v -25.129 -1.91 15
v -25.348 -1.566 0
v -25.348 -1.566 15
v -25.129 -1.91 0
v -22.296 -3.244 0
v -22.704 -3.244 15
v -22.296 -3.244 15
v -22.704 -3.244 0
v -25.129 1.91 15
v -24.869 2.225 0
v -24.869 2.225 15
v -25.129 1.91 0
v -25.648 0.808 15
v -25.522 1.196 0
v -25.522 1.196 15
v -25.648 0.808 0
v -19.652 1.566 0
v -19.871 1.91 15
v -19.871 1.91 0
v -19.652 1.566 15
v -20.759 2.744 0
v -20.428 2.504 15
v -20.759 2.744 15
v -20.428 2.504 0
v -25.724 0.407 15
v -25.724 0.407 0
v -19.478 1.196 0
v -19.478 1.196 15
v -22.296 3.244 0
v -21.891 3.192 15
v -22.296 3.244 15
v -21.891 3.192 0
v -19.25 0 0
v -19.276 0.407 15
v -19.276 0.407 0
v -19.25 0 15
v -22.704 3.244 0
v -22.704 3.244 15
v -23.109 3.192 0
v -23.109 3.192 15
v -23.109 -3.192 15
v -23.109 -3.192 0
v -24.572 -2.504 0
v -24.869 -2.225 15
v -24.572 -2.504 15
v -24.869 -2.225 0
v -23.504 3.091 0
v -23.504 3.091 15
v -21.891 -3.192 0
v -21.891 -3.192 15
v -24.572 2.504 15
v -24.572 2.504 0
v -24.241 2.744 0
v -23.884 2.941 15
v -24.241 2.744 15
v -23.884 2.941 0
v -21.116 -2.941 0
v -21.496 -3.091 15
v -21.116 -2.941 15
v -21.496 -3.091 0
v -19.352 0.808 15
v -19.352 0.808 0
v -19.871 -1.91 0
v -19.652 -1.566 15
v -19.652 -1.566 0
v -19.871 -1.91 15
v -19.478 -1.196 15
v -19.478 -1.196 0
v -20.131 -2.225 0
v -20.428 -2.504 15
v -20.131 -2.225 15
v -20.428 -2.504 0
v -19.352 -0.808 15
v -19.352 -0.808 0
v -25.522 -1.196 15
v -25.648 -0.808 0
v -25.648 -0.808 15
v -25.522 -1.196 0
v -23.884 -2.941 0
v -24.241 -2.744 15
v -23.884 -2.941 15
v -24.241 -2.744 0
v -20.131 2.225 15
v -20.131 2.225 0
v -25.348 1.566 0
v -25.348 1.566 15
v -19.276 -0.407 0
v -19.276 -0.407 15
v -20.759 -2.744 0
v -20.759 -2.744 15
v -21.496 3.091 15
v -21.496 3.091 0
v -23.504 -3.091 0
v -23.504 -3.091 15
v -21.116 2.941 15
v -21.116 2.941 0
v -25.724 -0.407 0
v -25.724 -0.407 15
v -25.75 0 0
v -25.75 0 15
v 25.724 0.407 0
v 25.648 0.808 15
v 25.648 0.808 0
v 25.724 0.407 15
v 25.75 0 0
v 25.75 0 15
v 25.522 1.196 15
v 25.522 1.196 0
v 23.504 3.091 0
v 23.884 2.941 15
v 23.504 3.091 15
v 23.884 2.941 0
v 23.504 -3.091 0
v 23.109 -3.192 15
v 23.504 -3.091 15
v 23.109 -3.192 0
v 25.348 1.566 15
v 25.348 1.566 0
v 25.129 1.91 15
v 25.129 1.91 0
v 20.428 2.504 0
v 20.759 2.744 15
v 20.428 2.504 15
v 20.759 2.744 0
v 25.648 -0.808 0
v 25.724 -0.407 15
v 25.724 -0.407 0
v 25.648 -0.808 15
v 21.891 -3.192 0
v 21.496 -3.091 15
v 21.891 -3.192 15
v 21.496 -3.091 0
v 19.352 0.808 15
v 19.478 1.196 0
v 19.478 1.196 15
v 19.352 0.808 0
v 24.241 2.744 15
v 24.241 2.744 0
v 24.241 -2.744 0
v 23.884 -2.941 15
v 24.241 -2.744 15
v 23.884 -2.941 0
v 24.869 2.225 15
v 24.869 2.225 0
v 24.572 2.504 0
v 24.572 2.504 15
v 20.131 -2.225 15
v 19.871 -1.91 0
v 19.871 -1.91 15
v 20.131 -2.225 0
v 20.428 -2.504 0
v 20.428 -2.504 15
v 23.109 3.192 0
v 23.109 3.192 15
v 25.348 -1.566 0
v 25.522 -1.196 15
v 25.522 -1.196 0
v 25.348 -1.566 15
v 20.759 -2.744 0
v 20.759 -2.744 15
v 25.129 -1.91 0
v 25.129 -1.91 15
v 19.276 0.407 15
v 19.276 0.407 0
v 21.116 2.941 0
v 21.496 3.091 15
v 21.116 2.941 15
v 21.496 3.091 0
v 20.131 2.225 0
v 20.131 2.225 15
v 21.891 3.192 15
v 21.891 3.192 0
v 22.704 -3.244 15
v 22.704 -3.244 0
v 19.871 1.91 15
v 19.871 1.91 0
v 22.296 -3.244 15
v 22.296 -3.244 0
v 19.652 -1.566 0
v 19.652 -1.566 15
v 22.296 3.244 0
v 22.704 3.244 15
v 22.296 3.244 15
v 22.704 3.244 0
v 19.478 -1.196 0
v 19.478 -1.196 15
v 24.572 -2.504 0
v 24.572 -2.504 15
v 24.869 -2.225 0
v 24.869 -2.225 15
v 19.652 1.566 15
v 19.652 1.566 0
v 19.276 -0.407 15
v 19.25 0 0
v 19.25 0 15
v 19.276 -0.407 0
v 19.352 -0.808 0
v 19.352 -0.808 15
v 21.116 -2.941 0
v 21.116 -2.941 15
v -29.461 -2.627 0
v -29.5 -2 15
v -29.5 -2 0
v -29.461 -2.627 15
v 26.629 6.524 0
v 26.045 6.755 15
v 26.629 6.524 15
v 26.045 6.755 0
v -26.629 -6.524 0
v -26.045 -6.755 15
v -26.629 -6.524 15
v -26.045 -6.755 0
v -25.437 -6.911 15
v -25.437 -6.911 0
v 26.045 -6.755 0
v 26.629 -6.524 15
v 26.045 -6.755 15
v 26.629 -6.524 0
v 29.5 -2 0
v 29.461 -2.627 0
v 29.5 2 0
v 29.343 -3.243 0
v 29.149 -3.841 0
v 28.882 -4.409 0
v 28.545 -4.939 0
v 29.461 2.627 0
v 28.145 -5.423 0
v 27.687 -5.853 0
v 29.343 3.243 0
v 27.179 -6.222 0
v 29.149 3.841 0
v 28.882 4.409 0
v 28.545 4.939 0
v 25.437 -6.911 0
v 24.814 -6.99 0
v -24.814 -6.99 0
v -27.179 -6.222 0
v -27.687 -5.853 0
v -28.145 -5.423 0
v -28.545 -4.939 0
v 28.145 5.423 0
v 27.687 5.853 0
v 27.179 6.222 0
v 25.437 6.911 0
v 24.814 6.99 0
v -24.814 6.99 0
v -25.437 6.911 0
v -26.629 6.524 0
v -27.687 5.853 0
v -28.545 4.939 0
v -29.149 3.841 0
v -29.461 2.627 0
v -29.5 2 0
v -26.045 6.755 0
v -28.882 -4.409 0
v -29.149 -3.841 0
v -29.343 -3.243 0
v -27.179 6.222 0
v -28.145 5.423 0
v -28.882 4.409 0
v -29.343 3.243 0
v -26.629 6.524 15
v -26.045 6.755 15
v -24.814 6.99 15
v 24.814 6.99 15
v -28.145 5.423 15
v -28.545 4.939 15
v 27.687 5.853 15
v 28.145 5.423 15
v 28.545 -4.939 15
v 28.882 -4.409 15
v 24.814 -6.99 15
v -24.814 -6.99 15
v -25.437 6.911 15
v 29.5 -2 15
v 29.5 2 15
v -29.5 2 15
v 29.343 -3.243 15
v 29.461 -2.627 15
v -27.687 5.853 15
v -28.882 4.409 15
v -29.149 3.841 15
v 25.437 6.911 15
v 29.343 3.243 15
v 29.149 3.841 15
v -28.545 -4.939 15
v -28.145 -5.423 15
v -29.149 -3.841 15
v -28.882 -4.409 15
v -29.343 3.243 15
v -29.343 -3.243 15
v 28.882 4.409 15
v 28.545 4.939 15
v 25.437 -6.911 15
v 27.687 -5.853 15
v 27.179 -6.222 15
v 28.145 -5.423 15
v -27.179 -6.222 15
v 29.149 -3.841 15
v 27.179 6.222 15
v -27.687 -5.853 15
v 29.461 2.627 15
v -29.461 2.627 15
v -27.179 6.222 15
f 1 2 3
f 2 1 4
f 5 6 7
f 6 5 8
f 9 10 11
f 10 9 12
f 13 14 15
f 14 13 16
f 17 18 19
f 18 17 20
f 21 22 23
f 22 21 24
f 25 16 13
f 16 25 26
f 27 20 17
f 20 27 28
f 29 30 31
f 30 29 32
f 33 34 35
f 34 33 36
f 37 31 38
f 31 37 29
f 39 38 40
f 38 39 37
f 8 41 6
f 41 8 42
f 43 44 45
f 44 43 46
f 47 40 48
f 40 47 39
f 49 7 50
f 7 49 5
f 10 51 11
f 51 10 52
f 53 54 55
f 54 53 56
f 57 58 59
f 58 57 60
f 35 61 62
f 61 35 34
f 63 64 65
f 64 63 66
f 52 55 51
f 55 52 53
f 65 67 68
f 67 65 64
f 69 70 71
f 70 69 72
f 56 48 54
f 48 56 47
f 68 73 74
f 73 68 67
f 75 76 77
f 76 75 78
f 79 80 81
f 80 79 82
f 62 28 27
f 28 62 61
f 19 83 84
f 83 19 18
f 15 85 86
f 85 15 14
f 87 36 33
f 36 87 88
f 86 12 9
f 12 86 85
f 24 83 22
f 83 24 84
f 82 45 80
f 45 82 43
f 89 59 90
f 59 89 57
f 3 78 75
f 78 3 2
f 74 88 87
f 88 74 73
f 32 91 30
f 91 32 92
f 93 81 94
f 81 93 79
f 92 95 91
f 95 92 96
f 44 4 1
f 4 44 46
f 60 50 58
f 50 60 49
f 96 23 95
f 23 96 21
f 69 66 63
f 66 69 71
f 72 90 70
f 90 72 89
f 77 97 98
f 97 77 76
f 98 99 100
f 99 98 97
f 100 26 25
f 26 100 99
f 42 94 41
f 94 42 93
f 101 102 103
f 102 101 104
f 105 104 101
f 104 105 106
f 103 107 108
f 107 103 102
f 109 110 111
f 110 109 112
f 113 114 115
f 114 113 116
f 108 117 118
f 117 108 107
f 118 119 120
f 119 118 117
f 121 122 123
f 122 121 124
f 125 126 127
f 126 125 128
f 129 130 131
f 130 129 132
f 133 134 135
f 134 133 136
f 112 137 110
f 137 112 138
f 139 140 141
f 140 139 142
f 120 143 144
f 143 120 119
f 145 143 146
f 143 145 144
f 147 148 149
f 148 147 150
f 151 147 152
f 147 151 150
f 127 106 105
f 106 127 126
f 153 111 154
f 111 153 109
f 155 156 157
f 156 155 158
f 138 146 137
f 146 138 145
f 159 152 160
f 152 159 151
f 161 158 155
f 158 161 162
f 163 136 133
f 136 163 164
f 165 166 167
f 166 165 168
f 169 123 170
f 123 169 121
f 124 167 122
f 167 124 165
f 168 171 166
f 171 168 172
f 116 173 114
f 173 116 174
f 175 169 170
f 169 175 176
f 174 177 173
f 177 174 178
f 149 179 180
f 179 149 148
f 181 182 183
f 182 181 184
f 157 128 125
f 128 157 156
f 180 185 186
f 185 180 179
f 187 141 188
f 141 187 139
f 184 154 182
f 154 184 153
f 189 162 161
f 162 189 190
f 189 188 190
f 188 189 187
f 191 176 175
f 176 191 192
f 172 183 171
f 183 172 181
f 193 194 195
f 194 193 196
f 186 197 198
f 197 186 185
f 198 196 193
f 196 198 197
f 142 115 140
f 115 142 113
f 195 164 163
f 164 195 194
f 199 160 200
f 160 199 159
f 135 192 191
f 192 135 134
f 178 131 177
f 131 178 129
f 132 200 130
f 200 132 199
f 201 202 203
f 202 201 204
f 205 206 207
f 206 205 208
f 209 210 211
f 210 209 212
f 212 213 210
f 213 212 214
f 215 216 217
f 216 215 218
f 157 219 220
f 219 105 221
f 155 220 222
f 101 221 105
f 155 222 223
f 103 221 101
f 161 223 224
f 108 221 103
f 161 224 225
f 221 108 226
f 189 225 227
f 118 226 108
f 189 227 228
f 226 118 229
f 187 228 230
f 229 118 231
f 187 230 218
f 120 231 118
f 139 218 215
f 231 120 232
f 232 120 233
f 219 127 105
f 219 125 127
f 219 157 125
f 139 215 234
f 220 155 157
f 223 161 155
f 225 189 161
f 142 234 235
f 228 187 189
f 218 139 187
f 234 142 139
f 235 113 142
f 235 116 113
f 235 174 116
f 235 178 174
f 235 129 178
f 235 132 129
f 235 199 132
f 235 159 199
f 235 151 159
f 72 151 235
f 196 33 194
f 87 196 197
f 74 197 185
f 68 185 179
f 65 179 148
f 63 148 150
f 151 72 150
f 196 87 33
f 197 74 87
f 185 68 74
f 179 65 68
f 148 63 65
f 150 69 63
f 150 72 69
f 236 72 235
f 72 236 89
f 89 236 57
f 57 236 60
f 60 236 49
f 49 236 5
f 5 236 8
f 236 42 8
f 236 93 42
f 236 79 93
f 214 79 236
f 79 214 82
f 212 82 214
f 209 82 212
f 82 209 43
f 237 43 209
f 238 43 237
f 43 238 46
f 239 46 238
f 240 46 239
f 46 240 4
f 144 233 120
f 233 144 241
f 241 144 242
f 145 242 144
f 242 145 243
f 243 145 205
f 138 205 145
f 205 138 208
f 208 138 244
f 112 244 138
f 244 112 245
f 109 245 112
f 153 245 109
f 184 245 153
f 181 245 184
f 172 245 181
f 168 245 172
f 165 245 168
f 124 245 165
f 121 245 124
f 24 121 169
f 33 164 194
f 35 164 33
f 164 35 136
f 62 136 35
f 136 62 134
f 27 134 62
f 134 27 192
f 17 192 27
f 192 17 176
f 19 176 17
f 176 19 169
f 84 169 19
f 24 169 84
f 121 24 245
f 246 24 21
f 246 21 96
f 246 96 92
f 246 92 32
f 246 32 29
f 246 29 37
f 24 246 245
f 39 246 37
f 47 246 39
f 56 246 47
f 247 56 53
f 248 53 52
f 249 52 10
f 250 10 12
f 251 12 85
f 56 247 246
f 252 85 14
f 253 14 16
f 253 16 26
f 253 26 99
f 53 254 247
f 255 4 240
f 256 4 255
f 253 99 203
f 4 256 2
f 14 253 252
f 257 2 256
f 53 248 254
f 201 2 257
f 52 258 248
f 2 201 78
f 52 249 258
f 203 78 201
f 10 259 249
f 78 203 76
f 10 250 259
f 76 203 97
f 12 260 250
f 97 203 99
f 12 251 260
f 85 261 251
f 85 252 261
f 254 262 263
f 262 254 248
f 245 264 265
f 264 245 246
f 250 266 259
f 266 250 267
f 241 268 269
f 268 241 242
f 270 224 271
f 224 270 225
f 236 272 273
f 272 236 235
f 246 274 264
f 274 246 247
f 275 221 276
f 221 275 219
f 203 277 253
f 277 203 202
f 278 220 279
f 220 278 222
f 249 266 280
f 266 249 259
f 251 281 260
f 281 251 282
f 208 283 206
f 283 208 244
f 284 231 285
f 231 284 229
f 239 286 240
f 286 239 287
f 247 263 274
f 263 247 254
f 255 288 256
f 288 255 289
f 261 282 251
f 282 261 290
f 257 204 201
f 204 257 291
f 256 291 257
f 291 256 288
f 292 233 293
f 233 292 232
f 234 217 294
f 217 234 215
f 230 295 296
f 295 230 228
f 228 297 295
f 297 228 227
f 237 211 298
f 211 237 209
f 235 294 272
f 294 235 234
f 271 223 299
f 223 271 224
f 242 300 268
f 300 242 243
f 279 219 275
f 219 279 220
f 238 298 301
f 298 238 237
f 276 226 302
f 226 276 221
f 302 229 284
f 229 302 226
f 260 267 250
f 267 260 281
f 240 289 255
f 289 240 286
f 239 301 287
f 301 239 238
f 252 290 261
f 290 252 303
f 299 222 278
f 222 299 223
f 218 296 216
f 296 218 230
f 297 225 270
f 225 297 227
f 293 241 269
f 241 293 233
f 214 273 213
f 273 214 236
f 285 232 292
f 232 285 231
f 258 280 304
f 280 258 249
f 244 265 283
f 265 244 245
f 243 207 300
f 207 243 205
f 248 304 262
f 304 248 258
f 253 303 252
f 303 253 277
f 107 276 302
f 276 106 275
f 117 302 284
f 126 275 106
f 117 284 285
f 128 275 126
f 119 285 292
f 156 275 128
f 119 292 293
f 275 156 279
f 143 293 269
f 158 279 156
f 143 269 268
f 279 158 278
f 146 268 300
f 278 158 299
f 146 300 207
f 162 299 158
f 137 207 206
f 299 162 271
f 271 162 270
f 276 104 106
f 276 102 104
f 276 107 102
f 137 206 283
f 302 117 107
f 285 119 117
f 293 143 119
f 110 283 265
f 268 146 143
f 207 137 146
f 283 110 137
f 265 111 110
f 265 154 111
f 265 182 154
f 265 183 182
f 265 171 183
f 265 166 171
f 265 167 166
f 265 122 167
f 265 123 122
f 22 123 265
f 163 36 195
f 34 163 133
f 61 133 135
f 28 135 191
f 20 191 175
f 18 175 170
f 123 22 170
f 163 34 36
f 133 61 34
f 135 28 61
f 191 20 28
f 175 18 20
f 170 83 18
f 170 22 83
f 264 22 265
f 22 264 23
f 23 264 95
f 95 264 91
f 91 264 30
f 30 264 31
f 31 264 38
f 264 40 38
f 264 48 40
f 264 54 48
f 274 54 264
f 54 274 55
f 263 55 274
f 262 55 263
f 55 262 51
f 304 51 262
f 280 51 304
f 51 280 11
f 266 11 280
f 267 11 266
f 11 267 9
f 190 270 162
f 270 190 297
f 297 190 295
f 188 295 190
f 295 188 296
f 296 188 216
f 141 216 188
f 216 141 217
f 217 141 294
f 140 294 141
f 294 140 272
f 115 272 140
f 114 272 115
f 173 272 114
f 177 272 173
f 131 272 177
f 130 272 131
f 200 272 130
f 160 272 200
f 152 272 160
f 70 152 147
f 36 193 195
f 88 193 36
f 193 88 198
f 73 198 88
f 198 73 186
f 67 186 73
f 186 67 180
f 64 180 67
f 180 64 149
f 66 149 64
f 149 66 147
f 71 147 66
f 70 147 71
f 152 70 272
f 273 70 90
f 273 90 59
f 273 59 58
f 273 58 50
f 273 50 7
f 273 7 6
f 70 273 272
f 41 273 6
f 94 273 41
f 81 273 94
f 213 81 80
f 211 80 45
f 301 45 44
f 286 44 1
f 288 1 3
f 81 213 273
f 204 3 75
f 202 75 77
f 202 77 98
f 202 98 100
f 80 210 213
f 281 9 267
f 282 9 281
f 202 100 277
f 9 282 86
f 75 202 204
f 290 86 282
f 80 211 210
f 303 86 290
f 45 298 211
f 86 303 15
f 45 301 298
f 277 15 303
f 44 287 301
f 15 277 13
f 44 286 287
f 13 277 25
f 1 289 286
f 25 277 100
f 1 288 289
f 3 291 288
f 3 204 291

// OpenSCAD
$fn = 50;


difference() {
	union() {
		hull() {
			translate(v = [-24.5000000000, 2.0000000000, 0]) {
				cylinder(h = 15, r = 5);
			}
			translate(v = [24.5000000000, 2.0000000000, 0]) {
				cylinder(h = 15, r = 5);
			}
			translate(v = [-24.5000000000, -2.0000000000, 0]) {
				cylinder(h = 15, r = 5);
			}
			translate(v = [24.5000000000, -2.0000000000, 0]) {
				cylinder(h = 15, r = 5);
			}
		}
	}
	union() {
		translate(v = [-22.5000000000, 0.0000000000, -100.0000000000]) {
			cylinder(h = 200, r = 3.2500000000);
		}
		translate(v = [-22.5000000000, 0.0000000000, -100.0000000000]) {
			cylinder(h = 200, r = 3.2500000000);
		}
		translate(v = [22.5000000000, 0.0000000000, -100.0000000000]) {
			cylinder(h = 200, r = 3.2500000000);
		}
		translate(v = [22.5000000000, 0.0000000000, -100.0000000000]) {
			cylinder(h = 200, r = 3.2500000000);
		}
	}
}
